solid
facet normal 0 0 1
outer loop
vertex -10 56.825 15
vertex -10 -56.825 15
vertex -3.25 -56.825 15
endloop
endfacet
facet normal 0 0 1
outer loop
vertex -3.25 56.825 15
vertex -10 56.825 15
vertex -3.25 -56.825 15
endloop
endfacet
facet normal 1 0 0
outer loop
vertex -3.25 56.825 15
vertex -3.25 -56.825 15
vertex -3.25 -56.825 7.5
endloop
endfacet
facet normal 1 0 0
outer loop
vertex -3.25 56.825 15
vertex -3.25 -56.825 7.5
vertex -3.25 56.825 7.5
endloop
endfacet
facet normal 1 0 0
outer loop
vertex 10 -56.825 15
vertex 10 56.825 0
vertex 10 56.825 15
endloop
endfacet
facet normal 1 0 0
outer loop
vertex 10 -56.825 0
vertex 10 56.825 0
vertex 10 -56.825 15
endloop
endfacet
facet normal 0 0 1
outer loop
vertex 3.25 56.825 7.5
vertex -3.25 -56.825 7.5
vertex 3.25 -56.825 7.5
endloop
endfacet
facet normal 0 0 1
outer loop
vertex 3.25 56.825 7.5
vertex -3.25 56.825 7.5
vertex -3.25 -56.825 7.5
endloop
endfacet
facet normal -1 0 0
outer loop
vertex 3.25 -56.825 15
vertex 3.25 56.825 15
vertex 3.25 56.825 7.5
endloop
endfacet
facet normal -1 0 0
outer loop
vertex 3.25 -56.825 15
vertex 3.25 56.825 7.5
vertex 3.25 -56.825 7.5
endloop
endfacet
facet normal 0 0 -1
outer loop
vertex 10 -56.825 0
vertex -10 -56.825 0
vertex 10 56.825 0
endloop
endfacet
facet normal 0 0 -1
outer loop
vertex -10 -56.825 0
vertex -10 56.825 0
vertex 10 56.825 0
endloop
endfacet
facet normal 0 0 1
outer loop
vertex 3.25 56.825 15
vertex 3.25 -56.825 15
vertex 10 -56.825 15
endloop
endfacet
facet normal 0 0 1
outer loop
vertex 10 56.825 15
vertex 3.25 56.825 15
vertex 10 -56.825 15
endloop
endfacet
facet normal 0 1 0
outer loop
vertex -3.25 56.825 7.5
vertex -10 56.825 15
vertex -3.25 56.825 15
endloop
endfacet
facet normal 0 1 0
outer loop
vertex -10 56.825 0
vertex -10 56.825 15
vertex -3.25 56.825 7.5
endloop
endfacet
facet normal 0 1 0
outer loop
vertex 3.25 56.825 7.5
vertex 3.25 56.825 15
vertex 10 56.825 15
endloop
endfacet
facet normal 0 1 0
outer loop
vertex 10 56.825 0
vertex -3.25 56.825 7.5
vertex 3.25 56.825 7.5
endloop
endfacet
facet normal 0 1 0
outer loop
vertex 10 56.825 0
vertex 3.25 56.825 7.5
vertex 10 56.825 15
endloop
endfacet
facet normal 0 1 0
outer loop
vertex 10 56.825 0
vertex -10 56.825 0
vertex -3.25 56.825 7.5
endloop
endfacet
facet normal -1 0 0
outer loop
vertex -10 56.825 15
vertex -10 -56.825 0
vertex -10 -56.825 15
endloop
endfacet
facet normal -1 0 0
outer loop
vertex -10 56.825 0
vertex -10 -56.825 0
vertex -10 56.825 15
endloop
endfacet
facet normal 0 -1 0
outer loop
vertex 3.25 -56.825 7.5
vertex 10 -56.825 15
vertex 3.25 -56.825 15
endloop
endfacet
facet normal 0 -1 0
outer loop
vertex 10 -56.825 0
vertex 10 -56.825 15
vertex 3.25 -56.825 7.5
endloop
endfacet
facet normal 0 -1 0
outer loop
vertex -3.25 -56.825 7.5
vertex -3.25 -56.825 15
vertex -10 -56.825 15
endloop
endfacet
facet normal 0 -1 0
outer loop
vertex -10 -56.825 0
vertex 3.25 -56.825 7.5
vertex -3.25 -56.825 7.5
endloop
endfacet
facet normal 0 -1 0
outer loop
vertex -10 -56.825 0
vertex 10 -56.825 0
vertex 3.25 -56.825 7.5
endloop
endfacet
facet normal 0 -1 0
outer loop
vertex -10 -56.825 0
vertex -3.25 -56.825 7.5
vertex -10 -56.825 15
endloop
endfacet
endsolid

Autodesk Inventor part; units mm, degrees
ref_plane "YZ Plane" through (0, 0, 0) normal (1, 0, 0) x (0, 1, 0)
ref_plane "XZ Plane" through (0, 0, 0) normal (0, 1, 0) x (-1, 0, 0)
ref_plane "XY Plane" through (0, 0, 0) normal (0, 0, 1) x (1, 0, 0)
sketch "Sketch1" plane through (0, 0, 0) normal (0, 0, 1) x (1, 0, 0)
  line L0 (-10, 56.825) -> (10, 56.825)
  line L1 (10, 56.825) -> (10, -56.825)
  line L2 (10, -56.825) -> (-10, -56.825)
  line L3 (-10, -56.825) -> (-10, 56.825)
  point P0 (0, 0)
  dimension "d0" = 113.65
  dimension "d1" = 56.825
  dimension "d2" = 20
  dimension "d3" = 10
extrude "Extrusion1" add sketch "Sketch1" along normal blind 15
sketch "Sketch2" plane through (0, 0, 15) normal (0, 0, 1) x (1, 0, 0)
  line L0 (-10, -56.825) -> (10, -56.825) projected
  line L1 (-3.25, 56.825) -> (3.25, 56.825)
  line L2 (3.25, 56.825) -> (3.25, -56.825)
  line L3 (3.25, -56.825) -> (-3.25, -56.825)
  line L4 (-3.25, -56.825) -> (-3.25, 56.825)
  line L5 (-10, 56.825) -> (-10, -56.825) projected
  line L6 (10, -56.825) -> (10, 56.825) projected
  point P0 (0, 0)
  dimension "d6" = 6.75
  dimension "d7" = 6.5
  dimension "d8" = 20
extrude "Extrusion2" cut sketch "Sketch2" against normal blind 7.5
equation "\"d1\" = 0.5 * d0"
equation "\"d3\" = 0.5 * d2"
equation "\"d6\" = -0.5 * d7 + 0.5 * d8"
properties part number "2208_Back Plate Groove_V1"
